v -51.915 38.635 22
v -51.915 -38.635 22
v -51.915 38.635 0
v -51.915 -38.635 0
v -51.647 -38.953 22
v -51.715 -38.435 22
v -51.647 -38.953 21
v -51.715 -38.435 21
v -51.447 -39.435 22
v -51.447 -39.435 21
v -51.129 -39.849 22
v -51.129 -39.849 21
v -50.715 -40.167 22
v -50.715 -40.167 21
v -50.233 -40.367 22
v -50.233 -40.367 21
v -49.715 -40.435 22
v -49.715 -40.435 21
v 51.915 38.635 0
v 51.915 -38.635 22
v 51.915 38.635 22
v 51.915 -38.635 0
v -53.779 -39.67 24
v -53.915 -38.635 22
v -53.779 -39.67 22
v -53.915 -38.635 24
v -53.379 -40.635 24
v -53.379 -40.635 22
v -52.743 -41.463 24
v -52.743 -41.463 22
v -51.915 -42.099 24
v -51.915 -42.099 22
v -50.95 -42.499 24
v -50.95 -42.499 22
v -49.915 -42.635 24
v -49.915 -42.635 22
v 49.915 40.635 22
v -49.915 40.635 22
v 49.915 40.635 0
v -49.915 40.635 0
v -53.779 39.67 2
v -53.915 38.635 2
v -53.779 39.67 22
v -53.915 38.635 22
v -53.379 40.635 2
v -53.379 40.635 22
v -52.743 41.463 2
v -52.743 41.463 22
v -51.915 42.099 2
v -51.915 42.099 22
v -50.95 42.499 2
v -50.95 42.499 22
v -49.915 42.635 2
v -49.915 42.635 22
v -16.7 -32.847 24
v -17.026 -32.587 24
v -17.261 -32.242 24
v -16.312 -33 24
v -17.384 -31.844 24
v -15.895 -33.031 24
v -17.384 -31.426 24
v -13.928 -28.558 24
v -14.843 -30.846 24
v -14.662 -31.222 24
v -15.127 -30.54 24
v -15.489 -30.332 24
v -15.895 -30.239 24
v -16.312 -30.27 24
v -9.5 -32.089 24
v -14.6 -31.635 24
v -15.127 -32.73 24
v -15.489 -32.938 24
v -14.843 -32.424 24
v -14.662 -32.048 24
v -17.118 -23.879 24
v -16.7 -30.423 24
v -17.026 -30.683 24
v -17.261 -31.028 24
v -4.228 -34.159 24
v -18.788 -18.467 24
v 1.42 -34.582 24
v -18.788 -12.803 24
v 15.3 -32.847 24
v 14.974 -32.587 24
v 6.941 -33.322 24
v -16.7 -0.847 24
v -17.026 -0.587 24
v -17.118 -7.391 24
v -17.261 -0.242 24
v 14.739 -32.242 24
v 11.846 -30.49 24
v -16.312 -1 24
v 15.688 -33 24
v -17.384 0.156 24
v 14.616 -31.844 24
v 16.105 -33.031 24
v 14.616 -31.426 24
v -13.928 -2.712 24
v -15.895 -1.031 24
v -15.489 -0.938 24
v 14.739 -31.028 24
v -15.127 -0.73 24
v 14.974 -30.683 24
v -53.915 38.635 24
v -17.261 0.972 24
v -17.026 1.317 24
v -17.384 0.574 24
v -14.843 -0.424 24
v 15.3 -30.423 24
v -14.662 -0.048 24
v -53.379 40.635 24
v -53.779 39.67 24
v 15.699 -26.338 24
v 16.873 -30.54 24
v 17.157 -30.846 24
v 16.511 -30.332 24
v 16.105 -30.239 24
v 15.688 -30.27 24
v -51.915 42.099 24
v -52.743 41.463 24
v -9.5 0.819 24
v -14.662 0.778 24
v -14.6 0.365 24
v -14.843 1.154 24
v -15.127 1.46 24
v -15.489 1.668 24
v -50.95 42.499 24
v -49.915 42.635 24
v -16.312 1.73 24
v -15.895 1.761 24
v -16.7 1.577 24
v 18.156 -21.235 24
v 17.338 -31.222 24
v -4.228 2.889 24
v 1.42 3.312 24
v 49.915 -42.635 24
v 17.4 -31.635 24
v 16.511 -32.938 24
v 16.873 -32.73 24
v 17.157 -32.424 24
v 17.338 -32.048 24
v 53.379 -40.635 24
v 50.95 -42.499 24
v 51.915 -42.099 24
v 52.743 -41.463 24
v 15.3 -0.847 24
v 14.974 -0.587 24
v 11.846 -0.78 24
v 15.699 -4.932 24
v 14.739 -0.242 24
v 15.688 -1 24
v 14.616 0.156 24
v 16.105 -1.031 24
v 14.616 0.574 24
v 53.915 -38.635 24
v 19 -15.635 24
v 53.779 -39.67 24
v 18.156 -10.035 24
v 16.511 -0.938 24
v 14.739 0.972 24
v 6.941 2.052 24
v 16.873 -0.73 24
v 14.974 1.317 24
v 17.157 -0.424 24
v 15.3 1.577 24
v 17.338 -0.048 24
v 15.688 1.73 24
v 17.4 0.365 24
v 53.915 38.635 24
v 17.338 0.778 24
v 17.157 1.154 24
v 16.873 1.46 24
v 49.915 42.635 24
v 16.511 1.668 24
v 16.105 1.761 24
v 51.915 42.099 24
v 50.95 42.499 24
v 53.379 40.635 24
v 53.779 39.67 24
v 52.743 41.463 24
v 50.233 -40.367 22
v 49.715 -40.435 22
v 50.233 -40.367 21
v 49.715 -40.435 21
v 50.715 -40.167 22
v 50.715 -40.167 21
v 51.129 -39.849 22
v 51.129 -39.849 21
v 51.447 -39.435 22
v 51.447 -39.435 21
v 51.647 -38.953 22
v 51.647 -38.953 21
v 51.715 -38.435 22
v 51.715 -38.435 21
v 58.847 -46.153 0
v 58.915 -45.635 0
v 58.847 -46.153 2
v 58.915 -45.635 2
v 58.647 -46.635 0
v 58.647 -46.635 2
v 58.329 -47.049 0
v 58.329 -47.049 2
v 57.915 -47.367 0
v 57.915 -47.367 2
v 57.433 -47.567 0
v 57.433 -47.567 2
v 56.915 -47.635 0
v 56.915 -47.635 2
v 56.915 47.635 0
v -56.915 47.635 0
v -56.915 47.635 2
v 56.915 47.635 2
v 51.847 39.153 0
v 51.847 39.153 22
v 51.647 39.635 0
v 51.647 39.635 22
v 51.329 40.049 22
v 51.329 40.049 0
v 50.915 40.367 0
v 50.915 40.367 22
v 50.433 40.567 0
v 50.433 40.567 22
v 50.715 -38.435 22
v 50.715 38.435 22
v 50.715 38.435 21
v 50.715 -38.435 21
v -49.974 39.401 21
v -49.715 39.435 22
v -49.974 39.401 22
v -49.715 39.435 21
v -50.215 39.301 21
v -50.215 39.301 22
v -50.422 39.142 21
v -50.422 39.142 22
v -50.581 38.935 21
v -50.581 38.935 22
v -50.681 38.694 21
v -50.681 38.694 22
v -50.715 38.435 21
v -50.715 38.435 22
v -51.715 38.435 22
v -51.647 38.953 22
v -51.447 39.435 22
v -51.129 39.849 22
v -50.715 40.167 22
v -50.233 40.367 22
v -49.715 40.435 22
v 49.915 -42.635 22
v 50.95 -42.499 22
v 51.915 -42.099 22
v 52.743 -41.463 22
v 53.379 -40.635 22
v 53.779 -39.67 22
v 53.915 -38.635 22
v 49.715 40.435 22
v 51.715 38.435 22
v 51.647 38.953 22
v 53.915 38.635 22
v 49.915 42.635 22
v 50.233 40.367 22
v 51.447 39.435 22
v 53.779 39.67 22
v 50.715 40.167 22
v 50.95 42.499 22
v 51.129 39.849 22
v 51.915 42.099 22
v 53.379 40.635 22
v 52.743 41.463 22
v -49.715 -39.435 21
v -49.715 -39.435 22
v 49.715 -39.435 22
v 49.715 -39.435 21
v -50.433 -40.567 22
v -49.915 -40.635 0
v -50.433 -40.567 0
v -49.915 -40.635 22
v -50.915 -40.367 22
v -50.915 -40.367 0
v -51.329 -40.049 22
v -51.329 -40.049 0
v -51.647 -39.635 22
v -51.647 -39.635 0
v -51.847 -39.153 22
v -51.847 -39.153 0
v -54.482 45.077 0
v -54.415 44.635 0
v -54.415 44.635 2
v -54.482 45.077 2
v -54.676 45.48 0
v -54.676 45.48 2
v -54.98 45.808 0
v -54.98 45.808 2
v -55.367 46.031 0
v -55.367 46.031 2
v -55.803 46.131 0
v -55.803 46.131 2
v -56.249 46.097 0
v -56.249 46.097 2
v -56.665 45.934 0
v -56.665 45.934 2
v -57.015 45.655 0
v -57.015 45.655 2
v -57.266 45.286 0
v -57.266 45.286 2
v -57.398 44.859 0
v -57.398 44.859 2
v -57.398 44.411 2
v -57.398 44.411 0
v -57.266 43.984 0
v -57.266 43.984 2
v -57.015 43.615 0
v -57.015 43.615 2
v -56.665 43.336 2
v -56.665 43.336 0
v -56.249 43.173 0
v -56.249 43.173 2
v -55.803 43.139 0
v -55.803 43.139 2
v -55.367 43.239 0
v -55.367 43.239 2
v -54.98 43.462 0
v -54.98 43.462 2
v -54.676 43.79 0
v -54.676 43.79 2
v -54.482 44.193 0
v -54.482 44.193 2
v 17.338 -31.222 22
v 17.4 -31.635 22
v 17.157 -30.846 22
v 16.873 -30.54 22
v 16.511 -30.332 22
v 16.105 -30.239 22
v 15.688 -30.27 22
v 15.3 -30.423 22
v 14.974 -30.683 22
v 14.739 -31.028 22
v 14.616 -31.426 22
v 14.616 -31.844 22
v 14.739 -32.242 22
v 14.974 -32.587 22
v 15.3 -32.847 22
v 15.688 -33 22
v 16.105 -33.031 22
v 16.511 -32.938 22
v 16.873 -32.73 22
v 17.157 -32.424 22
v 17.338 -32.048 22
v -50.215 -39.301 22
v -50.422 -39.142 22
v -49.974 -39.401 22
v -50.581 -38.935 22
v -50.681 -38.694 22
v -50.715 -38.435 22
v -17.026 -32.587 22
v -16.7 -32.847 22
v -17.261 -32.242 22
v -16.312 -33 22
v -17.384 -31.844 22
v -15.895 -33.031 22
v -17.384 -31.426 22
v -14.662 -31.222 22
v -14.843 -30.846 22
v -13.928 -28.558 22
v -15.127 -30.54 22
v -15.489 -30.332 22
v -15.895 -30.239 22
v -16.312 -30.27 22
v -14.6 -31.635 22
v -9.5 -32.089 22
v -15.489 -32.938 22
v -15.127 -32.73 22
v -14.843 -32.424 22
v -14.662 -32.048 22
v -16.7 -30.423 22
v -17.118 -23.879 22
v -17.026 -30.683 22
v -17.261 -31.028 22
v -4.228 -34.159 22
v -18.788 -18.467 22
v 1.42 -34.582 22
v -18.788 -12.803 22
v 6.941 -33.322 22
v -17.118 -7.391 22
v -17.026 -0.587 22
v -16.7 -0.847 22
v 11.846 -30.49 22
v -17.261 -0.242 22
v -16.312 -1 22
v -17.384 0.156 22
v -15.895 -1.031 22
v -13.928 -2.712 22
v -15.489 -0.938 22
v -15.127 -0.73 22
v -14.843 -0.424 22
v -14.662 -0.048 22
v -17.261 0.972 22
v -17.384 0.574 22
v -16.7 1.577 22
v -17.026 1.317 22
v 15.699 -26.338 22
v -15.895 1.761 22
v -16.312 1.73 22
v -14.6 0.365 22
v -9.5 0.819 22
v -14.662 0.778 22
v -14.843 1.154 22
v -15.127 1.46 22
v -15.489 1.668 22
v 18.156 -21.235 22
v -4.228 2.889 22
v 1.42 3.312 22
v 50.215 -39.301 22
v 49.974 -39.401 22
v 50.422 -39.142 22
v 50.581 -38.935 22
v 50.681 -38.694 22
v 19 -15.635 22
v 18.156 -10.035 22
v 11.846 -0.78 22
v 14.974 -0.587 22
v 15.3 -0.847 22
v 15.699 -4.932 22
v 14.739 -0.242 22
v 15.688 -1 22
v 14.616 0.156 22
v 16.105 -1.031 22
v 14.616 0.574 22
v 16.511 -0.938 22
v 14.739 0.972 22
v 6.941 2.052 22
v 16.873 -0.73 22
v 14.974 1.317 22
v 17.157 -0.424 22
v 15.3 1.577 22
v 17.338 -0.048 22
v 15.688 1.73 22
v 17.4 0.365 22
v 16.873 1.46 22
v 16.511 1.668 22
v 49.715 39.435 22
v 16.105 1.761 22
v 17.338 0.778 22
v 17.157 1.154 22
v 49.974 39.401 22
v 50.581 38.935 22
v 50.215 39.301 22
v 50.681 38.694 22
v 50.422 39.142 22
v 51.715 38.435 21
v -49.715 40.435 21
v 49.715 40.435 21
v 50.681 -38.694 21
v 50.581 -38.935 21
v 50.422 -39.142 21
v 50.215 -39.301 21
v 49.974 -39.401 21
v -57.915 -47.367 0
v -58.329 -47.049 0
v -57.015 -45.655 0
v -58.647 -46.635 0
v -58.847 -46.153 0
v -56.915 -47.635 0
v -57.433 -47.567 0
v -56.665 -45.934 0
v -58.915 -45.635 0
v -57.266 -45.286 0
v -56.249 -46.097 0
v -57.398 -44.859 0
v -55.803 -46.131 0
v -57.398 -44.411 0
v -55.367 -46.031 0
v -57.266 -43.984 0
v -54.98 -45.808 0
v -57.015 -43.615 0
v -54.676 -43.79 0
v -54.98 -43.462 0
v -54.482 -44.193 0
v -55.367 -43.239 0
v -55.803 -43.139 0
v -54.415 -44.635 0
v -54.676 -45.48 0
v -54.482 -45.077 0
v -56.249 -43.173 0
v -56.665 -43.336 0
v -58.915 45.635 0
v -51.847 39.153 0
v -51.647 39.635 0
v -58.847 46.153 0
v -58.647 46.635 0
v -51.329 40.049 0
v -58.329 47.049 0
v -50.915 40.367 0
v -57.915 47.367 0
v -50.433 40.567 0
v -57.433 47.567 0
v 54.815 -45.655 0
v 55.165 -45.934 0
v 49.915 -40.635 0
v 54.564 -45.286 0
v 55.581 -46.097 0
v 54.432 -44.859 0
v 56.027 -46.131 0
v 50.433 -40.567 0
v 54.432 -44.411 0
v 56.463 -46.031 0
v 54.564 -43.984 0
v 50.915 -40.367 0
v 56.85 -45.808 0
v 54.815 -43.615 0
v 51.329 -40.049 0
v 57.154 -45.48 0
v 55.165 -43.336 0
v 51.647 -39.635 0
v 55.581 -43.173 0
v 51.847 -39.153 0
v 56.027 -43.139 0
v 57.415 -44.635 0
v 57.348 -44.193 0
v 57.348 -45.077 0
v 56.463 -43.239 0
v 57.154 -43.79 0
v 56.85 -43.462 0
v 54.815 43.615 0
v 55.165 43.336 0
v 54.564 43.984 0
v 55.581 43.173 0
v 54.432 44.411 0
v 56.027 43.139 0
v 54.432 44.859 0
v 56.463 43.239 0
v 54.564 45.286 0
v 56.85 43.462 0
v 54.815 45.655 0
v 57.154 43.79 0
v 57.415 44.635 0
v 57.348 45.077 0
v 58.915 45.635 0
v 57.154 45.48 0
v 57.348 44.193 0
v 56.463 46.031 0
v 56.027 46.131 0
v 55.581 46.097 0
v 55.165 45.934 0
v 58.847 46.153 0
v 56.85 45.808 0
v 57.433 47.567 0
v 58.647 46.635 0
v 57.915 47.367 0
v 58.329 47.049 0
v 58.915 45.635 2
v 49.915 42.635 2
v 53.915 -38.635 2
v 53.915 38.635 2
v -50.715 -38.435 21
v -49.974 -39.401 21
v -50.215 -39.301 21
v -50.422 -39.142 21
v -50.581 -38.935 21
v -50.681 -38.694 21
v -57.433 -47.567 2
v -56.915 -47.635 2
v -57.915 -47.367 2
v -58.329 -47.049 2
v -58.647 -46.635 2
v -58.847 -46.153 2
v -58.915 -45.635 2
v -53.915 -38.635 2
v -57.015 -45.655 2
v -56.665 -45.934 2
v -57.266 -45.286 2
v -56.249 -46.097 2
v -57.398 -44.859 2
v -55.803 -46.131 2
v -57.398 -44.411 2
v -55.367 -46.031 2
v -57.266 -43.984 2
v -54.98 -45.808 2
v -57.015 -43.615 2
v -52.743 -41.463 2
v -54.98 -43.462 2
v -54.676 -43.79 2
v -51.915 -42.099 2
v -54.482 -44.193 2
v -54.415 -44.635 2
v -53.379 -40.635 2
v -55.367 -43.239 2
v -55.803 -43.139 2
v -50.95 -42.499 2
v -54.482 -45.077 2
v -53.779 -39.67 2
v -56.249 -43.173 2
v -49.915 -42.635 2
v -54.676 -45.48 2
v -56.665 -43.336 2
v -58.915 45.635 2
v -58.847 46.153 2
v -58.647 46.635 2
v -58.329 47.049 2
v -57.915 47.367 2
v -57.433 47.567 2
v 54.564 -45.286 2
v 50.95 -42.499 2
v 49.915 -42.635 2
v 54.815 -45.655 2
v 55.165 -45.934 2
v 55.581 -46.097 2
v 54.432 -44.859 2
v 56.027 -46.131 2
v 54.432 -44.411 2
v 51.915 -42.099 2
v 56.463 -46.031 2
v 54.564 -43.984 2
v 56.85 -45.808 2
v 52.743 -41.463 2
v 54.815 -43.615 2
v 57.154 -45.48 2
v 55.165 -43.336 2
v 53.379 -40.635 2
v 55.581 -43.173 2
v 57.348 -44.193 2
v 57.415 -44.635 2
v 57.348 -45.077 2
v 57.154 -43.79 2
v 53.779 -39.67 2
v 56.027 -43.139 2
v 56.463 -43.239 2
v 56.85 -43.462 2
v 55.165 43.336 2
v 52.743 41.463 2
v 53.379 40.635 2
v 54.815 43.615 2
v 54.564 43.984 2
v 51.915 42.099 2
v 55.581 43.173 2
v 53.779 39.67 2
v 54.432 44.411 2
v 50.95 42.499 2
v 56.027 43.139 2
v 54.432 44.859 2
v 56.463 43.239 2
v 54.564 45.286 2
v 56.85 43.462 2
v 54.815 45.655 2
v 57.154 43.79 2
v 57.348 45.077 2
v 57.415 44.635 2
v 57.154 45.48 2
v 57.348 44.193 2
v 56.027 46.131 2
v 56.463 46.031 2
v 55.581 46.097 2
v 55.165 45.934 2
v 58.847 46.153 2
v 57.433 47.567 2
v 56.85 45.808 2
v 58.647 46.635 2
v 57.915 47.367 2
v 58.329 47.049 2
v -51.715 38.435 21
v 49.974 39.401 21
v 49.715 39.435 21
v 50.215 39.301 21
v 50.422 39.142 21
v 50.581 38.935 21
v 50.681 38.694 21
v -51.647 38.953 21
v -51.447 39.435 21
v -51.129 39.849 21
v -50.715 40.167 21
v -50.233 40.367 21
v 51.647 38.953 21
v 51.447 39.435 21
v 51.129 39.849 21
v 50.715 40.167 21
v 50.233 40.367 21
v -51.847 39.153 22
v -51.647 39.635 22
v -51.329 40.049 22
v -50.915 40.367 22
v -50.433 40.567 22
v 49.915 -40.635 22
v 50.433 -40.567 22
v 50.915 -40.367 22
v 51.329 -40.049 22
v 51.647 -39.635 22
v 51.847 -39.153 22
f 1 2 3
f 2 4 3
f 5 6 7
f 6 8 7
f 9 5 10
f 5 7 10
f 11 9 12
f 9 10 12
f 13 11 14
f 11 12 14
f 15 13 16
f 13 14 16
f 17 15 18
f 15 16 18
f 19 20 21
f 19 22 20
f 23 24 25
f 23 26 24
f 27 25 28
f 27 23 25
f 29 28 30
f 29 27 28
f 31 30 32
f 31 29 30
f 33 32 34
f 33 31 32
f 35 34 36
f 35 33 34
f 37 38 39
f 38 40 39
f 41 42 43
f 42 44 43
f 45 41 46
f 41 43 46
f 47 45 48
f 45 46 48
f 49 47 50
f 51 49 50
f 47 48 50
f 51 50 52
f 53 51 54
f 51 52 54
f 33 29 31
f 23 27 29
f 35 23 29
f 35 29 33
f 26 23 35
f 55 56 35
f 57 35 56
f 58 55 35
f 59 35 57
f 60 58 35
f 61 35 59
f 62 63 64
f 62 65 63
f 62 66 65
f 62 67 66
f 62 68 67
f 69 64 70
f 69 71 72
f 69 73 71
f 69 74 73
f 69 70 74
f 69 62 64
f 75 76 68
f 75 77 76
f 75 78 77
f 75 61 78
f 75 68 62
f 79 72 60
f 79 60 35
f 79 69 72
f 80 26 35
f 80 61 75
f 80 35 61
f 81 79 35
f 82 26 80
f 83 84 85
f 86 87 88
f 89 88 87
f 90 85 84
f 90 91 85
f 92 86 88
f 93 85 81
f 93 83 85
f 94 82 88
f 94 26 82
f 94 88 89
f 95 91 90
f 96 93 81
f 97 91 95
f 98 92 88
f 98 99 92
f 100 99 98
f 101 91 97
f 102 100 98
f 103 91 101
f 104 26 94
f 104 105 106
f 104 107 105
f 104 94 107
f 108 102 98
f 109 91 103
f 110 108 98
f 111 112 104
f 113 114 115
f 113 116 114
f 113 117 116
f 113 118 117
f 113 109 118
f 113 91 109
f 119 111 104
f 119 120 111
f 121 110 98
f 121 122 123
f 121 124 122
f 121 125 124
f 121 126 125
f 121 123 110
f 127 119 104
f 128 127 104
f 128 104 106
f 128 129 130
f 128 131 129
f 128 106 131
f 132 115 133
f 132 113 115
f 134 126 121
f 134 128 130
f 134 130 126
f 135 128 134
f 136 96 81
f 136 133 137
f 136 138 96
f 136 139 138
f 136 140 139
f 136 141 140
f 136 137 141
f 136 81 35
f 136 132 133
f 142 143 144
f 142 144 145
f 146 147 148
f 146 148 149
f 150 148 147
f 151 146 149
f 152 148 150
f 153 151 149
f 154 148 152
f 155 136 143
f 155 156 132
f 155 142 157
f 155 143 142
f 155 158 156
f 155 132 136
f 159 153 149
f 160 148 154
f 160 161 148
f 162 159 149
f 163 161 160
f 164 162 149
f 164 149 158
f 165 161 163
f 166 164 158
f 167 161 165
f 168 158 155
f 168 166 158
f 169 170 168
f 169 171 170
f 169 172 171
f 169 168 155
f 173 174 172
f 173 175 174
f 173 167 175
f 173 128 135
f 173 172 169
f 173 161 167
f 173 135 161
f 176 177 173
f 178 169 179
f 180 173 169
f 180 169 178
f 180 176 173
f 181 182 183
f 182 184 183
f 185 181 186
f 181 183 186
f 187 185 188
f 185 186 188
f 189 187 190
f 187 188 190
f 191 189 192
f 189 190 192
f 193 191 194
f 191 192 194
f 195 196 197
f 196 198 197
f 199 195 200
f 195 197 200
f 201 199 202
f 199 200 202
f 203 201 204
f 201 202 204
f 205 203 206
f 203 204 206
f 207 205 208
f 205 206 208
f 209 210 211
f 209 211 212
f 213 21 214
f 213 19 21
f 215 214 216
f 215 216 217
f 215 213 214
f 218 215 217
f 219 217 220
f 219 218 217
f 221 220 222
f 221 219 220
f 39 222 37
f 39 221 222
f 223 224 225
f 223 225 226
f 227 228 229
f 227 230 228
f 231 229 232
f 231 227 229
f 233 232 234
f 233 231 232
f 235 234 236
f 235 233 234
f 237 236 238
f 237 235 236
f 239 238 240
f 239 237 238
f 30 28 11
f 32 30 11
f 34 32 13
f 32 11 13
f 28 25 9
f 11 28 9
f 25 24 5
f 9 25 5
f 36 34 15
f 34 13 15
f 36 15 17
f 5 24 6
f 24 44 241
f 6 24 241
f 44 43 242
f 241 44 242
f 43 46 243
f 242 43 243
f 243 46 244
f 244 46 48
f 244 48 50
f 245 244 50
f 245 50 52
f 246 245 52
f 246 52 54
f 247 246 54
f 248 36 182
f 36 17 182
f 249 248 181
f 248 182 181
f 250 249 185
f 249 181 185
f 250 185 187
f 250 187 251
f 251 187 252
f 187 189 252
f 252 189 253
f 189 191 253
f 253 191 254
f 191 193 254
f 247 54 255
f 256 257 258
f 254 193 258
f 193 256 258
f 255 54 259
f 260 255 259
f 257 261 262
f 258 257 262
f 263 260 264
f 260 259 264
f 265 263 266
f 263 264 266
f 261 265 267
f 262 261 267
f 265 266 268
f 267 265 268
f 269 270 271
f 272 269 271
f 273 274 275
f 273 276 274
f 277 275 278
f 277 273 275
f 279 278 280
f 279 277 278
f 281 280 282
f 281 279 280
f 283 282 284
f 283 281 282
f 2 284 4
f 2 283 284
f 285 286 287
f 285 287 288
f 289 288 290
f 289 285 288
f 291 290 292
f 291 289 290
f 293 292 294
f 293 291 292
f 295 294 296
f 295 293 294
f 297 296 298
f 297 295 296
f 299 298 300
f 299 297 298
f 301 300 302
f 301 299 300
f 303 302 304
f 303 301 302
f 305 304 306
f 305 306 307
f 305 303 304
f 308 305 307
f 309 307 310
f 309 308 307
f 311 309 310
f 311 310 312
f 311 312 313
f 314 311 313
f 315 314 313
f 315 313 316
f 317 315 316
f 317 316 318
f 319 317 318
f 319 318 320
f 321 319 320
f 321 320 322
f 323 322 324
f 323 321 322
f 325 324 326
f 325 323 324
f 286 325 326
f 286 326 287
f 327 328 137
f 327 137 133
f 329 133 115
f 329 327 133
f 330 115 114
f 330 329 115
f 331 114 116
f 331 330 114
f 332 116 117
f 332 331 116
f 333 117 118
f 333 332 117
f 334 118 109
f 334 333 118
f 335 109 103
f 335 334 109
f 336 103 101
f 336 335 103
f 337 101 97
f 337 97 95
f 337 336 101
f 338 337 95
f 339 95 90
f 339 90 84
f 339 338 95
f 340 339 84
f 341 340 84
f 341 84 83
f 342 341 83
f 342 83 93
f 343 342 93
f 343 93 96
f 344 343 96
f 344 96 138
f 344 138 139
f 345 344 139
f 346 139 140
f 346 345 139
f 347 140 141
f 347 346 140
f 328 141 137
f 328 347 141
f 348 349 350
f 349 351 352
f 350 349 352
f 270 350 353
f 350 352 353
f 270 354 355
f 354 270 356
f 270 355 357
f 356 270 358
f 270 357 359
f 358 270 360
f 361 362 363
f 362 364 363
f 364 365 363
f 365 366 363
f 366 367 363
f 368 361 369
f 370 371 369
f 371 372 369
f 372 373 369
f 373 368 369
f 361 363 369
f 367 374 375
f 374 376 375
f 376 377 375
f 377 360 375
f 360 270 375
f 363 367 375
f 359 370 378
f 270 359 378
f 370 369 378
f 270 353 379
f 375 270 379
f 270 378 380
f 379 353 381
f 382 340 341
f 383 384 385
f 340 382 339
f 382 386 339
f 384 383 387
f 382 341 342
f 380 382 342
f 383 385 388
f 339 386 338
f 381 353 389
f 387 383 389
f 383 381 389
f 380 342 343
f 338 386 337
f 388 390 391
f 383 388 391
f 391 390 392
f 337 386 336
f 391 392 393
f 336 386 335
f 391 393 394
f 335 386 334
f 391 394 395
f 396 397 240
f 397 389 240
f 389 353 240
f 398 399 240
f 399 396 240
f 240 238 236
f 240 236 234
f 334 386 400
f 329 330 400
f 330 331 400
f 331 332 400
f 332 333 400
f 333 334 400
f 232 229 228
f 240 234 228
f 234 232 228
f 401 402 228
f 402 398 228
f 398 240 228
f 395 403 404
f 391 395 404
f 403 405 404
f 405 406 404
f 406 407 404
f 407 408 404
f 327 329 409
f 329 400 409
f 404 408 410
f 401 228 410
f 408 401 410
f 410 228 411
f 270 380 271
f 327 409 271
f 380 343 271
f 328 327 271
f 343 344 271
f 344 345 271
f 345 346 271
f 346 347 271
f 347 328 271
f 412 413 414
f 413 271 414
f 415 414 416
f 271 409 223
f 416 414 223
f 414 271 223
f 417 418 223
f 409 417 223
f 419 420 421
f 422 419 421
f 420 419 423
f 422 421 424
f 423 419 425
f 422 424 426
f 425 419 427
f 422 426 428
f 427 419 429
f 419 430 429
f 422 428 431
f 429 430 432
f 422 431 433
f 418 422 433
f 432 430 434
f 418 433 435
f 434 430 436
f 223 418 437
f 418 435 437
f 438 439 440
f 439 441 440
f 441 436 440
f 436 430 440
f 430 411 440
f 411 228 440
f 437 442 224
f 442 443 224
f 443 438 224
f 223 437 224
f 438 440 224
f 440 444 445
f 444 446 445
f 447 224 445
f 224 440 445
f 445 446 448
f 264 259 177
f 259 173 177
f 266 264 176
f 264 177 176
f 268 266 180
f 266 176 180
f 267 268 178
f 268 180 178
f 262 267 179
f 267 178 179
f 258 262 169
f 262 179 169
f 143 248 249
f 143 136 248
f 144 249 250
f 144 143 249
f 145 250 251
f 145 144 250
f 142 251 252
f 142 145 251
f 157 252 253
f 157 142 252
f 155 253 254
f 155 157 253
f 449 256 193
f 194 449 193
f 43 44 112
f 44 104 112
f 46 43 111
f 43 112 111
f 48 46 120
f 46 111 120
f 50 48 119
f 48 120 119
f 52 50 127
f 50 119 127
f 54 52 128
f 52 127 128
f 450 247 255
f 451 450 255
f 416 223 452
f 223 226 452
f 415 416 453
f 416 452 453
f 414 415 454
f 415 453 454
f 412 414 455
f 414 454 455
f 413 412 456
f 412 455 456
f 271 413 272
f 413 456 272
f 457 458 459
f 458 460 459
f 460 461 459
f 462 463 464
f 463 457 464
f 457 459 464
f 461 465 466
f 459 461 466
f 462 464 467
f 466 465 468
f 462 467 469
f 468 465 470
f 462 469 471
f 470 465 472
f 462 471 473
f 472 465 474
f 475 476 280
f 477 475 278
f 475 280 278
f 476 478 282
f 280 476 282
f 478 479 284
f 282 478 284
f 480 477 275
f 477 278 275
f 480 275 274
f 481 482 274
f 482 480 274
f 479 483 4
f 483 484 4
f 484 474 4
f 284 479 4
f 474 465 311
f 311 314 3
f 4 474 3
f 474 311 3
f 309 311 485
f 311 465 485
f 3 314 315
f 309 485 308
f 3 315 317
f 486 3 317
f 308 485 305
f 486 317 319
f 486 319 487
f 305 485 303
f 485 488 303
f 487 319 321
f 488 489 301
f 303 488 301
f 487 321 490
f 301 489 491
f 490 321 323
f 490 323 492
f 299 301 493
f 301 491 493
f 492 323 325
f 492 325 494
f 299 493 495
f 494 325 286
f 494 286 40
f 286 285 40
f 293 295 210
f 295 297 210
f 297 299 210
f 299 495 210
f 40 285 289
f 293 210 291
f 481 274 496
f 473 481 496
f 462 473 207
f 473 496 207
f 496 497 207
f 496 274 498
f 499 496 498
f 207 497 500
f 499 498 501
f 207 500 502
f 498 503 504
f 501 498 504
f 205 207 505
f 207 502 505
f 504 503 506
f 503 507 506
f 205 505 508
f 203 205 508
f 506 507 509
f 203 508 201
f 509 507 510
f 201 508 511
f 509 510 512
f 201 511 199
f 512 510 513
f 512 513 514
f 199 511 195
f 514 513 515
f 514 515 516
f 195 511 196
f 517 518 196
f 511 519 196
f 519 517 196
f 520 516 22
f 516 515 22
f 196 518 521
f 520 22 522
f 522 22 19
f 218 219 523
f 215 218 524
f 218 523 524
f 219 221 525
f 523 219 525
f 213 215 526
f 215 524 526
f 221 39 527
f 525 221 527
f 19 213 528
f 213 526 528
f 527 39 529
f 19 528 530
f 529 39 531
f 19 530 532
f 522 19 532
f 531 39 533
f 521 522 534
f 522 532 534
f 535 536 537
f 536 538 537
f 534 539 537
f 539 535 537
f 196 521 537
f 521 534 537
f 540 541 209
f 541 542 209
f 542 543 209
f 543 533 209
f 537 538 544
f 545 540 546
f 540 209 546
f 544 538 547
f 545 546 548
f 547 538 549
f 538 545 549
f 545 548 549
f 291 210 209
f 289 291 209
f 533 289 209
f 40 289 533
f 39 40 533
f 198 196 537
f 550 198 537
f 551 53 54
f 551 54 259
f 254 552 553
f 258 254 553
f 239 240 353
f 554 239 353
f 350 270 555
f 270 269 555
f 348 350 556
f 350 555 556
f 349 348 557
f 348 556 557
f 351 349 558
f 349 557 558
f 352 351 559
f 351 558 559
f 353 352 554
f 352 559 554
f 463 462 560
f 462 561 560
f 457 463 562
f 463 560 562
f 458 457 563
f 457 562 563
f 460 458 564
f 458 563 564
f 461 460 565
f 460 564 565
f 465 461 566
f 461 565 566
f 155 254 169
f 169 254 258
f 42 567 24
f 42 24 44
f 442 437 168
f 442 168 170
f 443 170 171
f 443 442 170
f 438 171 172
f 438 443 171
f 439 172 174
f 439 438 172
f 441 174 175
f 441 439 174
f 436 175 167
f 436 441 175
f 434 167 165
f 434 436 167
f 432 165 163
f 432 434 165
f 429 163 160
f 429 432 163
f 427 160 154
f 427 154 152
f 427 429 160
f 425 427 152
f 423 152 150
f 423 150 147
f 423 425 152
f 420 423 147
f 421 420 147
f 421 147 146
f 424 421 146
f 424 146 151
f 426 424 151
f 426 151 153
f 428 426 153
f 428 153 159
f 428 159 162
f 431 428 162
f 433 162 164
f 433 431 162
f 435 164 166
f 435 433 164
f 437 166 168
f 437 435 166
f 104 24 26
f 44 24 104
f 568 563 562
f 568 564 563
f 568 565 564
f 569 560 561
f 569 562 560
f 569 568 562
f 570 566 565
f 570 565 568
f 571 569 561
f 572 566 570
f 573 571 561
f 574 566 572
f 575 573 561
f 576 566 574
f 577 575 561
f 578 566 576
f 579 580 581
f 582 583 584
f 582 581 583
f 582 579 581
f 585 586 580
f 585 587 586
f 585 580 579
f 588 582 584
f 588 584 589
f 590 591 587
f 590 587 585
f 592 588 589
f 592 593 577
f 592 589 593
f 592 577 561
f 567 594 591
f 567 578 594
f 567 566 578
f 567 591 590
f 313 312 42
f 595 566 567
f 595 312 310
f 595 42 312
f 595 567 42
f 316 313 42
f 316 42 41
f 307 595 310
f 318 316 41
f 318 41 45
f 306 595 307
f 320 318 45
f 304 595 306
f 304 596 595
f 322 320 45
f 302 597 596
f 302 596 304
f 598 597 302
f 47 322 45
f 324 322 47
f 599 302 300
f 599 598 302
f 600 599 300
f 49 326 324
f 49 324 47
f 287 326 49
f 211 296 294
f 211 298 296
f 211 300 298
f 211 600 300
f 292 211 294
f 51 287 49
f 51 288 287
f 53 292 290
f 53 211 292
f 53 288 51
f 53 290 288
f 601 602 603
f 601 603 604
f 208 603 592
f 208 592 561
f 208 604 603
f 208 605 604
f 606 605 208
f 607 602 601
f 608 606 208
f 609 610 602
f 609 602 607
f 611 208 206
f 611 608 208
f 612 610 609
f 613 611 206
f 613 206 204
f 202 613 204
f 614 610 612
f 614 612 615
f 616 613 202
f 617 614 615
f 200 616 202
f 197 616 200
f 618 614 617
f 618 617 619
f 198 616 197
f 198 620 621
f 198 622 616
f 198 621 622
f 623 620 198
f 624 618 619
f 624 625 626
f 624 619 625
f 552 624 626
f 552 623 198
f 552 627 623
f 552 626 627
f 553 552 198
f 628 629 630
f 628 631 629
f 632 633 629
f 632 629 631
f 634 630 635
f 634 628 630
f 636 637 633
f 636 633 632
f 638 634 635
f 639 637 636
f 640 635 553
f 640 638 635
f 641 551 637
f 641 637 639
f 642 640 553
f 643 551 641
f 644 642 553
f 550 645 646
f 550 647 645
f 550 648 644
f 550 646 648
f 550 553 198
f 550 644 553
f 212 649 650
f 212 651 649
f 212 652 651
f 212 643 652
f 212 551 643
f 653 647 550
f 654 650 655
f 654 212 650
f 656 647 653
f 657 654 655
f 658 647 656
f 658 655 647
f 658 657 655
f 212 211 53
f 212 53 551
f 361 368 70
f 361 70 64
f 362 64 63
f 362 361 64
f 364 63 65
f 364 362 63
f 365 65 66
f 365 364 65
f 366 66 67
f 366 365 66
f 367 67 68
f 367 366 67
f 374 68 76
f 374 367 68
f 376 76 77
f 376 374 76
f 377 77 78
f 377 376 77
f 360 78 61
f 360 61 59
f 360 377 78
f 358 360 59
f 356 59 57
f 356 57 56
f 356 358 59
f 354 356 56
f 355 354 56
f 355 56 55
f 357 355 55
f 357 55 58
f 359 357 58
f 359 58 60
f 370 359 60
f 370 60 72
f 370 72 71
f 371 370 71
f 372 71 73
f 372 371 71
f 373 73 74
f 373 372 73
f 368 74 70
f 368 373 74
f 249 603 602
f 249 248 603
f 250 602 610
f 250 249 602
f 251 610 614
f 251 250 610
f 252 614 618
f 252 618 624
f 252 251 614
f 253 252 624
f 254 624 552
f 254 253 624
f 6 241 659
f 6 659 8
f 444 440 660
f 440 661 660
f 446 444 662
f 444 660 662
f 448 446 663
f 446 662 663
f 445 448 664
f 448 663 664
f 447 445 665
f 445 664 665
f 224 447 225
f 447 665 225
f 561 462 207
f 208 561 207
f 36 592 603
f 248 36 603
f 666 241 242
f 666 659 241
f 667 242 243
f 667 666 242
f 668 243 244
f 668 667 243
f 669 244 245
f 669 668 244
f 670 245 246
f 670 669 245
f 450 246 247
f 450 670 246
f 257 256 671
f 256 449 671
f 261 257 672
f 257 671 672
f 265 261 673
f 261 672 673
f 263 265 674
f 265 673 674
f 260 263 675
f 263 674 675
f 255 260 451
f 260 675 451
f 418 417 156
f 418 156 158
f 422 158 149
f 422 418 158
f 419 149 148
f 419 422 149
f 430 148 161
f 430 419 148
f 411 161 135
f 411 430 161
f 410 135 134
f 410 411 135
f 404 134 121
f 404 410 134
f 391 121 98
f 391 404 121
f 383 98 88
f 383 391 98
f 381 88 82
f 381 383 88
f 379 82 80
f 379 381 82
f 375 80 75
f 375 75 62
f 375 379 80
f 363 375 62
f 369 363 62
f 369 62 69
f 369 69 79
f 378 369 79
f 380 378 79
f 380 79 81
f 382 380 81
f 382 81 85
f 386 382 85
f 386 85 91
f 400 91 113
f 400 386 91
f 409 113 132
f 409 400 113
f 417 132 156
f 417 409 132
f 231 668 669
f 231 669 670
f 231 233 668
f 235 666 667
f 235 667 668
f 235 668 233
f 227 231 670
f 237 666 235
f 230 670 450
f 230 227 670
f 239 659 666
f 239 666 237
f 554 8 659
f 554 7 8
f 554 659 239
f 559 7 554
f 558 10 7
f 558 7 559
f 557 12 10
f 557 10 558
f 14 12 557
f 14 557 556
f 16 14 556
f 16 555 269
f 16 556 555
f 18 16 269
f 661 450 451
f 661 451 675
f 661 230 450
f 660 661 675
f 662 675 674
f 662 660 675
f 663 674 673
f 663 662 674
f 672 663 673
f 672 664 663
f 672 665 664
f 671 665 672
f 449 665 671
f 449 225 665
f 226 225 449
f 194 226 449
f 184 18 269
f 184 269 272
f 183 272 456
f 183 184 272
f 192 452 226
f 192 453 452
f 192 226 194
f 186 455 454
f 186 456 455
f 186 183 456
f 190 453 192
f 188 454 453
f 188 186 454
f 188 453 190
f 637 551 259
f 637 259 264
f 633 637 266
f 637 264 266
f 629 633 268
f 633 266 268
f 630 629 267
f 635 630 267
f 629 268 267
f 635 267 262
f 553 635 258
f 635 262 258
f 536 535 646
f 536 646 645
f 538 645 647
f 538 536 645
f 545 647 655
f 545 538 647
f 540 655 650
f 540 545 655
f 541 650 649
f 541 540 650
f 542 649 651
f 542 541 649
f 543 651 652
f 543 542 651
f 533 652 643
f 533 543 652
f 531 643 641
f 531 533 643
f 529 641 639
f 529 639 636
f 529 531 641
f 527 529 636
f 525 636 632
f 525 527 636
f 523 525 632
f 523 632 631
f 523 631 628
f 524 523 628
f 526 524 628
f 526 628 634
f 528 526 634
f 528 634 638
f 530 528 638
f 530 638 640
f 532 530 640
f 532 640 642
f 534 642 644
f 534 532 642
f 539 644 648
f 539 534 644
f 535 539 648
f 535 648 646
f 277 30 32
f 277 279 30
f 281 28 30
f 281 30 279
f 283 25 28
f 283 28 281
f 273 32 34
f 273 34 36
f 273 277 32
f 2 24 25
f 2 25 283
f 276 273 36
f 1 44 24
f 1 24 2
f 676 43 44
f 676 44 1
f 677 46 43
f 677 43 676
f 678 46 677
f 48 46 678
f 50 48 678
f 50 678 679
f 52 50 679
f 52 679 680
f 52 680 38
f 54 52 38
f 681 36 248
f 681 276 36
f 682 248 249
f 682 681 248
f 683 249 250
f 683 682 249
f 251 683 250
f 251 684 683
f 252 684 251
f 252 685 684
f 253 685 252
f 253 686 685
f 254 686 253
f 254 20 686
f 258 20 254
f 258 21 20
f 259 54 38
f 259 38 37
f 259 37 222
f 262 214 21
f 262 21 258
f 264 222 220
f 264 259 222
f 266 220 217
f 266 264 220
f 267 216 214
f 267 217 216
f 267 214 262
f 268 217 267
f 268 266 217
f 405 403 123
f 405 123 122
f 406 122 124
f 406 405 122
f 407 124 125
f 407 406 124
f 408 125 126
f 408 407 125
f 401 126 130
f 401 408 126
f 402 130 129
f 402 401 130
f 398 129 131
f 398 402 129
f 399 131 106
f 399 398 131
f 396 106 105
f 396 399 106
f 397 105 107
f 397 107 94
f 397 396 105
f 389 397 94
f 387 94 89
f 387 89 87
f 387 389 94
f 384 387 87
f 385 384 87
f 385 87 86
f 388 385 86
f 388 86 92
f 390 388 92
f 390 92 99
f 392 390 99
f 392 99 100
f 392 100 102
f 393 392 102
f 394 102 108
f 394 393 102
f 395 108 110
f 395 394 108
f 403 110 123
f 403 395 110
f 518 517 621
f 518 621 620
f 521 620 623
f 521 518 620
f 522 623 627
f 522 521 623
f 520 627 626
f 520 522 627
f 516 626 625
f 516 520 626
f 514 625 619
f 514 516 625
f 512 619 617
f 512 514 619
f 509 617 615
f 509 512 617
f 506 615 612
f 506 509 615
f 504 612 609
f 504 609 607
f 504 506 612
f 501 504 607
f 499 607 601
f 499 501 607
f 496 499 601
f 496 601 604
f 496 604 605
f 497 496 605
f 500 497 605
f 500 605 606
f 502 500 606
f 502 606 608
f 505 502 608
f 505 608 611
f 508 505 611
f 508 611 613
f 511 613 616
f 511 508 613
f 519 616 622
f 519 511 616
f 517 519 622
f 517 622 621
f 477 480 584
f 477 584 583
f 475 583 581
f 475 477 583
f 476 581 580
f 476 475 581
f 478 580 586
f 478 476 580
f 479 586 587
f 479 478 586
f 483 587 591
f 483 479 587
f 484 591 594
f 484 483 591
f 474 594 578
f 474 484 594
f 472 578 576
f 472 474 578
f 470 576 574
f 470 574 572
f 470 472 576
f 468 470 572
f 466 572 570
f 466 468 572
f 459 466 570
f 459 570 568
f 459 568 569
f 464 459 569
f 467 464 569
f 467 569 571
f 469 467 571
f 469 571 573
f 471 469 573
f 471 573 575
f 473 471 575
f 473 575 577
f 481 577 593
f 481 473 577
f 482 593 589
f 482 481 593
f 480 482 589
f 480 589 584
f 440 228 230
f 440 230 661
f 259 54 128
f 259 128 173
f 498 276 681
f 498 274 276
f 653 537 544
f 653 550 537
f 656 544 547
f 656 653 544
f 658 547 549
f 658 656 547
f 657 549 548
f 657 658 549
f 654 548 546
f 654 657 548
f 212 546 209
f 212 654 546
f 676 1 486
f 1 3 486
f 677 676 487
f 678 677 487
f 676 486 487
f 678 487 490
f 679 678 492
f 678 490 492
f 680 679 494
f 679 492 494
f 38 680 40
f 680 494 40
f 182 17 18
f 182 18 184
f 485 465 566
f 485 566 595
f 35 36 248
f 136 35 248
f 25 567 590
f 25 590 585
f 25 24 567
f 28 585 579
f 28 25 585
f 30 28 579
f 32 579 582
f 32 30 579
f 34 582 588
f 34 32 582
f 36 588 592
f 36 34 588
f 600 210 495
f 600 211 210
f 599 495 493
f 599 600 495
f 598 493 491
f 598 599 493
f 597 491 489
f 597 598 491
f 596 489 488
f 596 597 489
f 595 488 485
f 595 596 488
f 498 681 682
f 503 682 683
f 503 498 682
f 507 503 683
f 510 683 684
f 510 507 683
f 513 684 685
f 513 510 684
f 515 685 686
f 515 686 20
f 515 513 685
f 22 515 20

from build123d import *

# Parameters (mm, degrees)
F0_W     = 117.83
F0_H     = 95.27
F0_R     = 1.5
F0_W_2   = 103.83
F0_H_2   = 81.27
F1_DEPTH = 2
F2_W     = 107.83
F2_H     = 85.27
F2_W_2   = 103.83
F2_H_2   = 81.27
F3_DEPTH = 20
F4_R     = 2
F5_W     = 107.83
F5_H     = 85.27
F5_R     = 1.4
F5_R_2   = 19
F6_DEPTH = 2
F7_W     = 103.43
F7_H     = 80.87
F7_W_2   = 101.43
F7_H_2   = 78.87
F8_DEPTH = 1
F9_R     = 2
F9_2_R   = 2
F10_R    = 1
F11_R    = 4
F11_2_R  = 4


with BuildPart() as f1:
    # F0 (on Top) → F1 (new body)
    with BuildSketch(Plane.XY):
        Rectangle(F0_W, F0_H)
        with Locations((-55.915, -44.635)):
            Circle(F0_R, mode=Mode.SUBTRACT)
        with Locations((55.915, -44.635)):
            Circle(F0_R, mode=Mode.SUBTRACT)
        with Locations((-55.915, 44.635)):
            Circle(F0_R, mode=Mode.SUBTRACT)
        Rectangle(F0_W_2, F0_H_2, mode=Mode.SUBTRACT)
        with Locations((55.915, 44.635)):
            Circle(F0_R, mode=Mode.SUBTRACT)
    extrude(amount=F1_DEPTH)

    # F2 (on face) → F3 (join)
    with BuildSketch(Plane.XY.offset(2)):
        Rectangle(F2_W, F2_H)
        Rectangle(F2_W_2, F2_H_2, mode=Mode.SUBTRACT)
    extrude(amount=F3_DEPTH)

    # F4
    f4_edges = [f1.edges().sort_by_distance(p)[0] for p in [
        (-58.915, -47.635, 1),
        (58.915, -47.635, 1),
        (-58.915, 47.635, 1),
        (58.915, 47.635, 1),
    ]]
    fillet(f4_edges, radius=F4_R)

    # F9
    f9_edges = [f1.edges().sort_by_distance(p)[0] for p in [
        (51.915, 40.635, 11),
        (51.915, -40.635, 11),
        (-51.915, -40.635, 11),
        (-51.915, 40.635, 11),
    ]]
    fillet(f9_edges, radius=F9_R)

    # F11
    f11_edges = [f1.edges().sort_by_distance(p)[0] for p in [
        (53.915, -42.635, 12),
        (-53.915, -42.635, 12),
        (-53.915, 42.635, 12),
        (53.915, 42.635, 12),
    ]]
    fillet(f11_edges, radius=F11_R)


with BuildPart() as f6:
    # F5 (on face) → F6 (new body)
    with BuildSketch(Plane.XY.offset(22)):
        Rectangle(F5_W, F5_H)
        with Locations((-16, -31.635)):
            Circle(F5_R, mode=Mode.SUBTRACT)
        with Locations((16, -31.635)):
            Circle(F5_R, mode=Mode.SUBTRACT)
        with Locations((0, -15.635)):
            Circle(F5_R_2, mode=Mode.SUBTRACT)
        with Locations((-16, 0.365)):
            Circle(F5_R, mode=Mode.SUBTRACT)
        with Locations((16, 0.365)):
            Circle(F5_R, mode=Mode.SUBTRACT)
    extrude(amount=F6_DEPTH)

    # F7 (on face) → F8 (join)
    with BuildSketch(Plane(origin=(0, 0, 22), x_dir=(1, 0, 0), z_dir=(0, 0, -1))):
        Rectangle(F7_W, F7_H)
        Rectangle(F7_W_2, F7_H_2, mode=Mode.SUBTRACT)
    extrude(amount=F8_DEPTH)

    # F9#2
    f9_2_edges = [f6.edges().sort_by_distance(p)[0] for p in [
        (51.715, -40.435, 21.5),
        (51.715, 40.435, 21.5),
        (-51.715, 40.435, 21.5),
        (-51.715, -40.435, 21.5),
    ]]
    fillet(f9_2_edges, radius=F9_2_R)

    # F10
    f10_edges = [f6.edges().sort_by_distance(p)[0] for p in [
        (-50.715, -39.435, 21.5),
        (50.715, -39.435, 21.5),
        (-50.715, 39.435, 21.5),
        (50.715, 39.435, 21.5),
    ]]
    fillet(f10_edges, radius=F10_R)

    # F11#2
    f11_2_edges = [f6.edges().sort_by_distance(p)[0] for p in [
        (53.915, 42.635, 23),
        (-53.915, 42.635, 23),
        (-53.915, -42.635, 23),
        (53.915, -42.635, 23),
    ]]
    fillet(f11_2_edges, radius=F11_2_R)


solid = Compound([f1.part, f6.part])
